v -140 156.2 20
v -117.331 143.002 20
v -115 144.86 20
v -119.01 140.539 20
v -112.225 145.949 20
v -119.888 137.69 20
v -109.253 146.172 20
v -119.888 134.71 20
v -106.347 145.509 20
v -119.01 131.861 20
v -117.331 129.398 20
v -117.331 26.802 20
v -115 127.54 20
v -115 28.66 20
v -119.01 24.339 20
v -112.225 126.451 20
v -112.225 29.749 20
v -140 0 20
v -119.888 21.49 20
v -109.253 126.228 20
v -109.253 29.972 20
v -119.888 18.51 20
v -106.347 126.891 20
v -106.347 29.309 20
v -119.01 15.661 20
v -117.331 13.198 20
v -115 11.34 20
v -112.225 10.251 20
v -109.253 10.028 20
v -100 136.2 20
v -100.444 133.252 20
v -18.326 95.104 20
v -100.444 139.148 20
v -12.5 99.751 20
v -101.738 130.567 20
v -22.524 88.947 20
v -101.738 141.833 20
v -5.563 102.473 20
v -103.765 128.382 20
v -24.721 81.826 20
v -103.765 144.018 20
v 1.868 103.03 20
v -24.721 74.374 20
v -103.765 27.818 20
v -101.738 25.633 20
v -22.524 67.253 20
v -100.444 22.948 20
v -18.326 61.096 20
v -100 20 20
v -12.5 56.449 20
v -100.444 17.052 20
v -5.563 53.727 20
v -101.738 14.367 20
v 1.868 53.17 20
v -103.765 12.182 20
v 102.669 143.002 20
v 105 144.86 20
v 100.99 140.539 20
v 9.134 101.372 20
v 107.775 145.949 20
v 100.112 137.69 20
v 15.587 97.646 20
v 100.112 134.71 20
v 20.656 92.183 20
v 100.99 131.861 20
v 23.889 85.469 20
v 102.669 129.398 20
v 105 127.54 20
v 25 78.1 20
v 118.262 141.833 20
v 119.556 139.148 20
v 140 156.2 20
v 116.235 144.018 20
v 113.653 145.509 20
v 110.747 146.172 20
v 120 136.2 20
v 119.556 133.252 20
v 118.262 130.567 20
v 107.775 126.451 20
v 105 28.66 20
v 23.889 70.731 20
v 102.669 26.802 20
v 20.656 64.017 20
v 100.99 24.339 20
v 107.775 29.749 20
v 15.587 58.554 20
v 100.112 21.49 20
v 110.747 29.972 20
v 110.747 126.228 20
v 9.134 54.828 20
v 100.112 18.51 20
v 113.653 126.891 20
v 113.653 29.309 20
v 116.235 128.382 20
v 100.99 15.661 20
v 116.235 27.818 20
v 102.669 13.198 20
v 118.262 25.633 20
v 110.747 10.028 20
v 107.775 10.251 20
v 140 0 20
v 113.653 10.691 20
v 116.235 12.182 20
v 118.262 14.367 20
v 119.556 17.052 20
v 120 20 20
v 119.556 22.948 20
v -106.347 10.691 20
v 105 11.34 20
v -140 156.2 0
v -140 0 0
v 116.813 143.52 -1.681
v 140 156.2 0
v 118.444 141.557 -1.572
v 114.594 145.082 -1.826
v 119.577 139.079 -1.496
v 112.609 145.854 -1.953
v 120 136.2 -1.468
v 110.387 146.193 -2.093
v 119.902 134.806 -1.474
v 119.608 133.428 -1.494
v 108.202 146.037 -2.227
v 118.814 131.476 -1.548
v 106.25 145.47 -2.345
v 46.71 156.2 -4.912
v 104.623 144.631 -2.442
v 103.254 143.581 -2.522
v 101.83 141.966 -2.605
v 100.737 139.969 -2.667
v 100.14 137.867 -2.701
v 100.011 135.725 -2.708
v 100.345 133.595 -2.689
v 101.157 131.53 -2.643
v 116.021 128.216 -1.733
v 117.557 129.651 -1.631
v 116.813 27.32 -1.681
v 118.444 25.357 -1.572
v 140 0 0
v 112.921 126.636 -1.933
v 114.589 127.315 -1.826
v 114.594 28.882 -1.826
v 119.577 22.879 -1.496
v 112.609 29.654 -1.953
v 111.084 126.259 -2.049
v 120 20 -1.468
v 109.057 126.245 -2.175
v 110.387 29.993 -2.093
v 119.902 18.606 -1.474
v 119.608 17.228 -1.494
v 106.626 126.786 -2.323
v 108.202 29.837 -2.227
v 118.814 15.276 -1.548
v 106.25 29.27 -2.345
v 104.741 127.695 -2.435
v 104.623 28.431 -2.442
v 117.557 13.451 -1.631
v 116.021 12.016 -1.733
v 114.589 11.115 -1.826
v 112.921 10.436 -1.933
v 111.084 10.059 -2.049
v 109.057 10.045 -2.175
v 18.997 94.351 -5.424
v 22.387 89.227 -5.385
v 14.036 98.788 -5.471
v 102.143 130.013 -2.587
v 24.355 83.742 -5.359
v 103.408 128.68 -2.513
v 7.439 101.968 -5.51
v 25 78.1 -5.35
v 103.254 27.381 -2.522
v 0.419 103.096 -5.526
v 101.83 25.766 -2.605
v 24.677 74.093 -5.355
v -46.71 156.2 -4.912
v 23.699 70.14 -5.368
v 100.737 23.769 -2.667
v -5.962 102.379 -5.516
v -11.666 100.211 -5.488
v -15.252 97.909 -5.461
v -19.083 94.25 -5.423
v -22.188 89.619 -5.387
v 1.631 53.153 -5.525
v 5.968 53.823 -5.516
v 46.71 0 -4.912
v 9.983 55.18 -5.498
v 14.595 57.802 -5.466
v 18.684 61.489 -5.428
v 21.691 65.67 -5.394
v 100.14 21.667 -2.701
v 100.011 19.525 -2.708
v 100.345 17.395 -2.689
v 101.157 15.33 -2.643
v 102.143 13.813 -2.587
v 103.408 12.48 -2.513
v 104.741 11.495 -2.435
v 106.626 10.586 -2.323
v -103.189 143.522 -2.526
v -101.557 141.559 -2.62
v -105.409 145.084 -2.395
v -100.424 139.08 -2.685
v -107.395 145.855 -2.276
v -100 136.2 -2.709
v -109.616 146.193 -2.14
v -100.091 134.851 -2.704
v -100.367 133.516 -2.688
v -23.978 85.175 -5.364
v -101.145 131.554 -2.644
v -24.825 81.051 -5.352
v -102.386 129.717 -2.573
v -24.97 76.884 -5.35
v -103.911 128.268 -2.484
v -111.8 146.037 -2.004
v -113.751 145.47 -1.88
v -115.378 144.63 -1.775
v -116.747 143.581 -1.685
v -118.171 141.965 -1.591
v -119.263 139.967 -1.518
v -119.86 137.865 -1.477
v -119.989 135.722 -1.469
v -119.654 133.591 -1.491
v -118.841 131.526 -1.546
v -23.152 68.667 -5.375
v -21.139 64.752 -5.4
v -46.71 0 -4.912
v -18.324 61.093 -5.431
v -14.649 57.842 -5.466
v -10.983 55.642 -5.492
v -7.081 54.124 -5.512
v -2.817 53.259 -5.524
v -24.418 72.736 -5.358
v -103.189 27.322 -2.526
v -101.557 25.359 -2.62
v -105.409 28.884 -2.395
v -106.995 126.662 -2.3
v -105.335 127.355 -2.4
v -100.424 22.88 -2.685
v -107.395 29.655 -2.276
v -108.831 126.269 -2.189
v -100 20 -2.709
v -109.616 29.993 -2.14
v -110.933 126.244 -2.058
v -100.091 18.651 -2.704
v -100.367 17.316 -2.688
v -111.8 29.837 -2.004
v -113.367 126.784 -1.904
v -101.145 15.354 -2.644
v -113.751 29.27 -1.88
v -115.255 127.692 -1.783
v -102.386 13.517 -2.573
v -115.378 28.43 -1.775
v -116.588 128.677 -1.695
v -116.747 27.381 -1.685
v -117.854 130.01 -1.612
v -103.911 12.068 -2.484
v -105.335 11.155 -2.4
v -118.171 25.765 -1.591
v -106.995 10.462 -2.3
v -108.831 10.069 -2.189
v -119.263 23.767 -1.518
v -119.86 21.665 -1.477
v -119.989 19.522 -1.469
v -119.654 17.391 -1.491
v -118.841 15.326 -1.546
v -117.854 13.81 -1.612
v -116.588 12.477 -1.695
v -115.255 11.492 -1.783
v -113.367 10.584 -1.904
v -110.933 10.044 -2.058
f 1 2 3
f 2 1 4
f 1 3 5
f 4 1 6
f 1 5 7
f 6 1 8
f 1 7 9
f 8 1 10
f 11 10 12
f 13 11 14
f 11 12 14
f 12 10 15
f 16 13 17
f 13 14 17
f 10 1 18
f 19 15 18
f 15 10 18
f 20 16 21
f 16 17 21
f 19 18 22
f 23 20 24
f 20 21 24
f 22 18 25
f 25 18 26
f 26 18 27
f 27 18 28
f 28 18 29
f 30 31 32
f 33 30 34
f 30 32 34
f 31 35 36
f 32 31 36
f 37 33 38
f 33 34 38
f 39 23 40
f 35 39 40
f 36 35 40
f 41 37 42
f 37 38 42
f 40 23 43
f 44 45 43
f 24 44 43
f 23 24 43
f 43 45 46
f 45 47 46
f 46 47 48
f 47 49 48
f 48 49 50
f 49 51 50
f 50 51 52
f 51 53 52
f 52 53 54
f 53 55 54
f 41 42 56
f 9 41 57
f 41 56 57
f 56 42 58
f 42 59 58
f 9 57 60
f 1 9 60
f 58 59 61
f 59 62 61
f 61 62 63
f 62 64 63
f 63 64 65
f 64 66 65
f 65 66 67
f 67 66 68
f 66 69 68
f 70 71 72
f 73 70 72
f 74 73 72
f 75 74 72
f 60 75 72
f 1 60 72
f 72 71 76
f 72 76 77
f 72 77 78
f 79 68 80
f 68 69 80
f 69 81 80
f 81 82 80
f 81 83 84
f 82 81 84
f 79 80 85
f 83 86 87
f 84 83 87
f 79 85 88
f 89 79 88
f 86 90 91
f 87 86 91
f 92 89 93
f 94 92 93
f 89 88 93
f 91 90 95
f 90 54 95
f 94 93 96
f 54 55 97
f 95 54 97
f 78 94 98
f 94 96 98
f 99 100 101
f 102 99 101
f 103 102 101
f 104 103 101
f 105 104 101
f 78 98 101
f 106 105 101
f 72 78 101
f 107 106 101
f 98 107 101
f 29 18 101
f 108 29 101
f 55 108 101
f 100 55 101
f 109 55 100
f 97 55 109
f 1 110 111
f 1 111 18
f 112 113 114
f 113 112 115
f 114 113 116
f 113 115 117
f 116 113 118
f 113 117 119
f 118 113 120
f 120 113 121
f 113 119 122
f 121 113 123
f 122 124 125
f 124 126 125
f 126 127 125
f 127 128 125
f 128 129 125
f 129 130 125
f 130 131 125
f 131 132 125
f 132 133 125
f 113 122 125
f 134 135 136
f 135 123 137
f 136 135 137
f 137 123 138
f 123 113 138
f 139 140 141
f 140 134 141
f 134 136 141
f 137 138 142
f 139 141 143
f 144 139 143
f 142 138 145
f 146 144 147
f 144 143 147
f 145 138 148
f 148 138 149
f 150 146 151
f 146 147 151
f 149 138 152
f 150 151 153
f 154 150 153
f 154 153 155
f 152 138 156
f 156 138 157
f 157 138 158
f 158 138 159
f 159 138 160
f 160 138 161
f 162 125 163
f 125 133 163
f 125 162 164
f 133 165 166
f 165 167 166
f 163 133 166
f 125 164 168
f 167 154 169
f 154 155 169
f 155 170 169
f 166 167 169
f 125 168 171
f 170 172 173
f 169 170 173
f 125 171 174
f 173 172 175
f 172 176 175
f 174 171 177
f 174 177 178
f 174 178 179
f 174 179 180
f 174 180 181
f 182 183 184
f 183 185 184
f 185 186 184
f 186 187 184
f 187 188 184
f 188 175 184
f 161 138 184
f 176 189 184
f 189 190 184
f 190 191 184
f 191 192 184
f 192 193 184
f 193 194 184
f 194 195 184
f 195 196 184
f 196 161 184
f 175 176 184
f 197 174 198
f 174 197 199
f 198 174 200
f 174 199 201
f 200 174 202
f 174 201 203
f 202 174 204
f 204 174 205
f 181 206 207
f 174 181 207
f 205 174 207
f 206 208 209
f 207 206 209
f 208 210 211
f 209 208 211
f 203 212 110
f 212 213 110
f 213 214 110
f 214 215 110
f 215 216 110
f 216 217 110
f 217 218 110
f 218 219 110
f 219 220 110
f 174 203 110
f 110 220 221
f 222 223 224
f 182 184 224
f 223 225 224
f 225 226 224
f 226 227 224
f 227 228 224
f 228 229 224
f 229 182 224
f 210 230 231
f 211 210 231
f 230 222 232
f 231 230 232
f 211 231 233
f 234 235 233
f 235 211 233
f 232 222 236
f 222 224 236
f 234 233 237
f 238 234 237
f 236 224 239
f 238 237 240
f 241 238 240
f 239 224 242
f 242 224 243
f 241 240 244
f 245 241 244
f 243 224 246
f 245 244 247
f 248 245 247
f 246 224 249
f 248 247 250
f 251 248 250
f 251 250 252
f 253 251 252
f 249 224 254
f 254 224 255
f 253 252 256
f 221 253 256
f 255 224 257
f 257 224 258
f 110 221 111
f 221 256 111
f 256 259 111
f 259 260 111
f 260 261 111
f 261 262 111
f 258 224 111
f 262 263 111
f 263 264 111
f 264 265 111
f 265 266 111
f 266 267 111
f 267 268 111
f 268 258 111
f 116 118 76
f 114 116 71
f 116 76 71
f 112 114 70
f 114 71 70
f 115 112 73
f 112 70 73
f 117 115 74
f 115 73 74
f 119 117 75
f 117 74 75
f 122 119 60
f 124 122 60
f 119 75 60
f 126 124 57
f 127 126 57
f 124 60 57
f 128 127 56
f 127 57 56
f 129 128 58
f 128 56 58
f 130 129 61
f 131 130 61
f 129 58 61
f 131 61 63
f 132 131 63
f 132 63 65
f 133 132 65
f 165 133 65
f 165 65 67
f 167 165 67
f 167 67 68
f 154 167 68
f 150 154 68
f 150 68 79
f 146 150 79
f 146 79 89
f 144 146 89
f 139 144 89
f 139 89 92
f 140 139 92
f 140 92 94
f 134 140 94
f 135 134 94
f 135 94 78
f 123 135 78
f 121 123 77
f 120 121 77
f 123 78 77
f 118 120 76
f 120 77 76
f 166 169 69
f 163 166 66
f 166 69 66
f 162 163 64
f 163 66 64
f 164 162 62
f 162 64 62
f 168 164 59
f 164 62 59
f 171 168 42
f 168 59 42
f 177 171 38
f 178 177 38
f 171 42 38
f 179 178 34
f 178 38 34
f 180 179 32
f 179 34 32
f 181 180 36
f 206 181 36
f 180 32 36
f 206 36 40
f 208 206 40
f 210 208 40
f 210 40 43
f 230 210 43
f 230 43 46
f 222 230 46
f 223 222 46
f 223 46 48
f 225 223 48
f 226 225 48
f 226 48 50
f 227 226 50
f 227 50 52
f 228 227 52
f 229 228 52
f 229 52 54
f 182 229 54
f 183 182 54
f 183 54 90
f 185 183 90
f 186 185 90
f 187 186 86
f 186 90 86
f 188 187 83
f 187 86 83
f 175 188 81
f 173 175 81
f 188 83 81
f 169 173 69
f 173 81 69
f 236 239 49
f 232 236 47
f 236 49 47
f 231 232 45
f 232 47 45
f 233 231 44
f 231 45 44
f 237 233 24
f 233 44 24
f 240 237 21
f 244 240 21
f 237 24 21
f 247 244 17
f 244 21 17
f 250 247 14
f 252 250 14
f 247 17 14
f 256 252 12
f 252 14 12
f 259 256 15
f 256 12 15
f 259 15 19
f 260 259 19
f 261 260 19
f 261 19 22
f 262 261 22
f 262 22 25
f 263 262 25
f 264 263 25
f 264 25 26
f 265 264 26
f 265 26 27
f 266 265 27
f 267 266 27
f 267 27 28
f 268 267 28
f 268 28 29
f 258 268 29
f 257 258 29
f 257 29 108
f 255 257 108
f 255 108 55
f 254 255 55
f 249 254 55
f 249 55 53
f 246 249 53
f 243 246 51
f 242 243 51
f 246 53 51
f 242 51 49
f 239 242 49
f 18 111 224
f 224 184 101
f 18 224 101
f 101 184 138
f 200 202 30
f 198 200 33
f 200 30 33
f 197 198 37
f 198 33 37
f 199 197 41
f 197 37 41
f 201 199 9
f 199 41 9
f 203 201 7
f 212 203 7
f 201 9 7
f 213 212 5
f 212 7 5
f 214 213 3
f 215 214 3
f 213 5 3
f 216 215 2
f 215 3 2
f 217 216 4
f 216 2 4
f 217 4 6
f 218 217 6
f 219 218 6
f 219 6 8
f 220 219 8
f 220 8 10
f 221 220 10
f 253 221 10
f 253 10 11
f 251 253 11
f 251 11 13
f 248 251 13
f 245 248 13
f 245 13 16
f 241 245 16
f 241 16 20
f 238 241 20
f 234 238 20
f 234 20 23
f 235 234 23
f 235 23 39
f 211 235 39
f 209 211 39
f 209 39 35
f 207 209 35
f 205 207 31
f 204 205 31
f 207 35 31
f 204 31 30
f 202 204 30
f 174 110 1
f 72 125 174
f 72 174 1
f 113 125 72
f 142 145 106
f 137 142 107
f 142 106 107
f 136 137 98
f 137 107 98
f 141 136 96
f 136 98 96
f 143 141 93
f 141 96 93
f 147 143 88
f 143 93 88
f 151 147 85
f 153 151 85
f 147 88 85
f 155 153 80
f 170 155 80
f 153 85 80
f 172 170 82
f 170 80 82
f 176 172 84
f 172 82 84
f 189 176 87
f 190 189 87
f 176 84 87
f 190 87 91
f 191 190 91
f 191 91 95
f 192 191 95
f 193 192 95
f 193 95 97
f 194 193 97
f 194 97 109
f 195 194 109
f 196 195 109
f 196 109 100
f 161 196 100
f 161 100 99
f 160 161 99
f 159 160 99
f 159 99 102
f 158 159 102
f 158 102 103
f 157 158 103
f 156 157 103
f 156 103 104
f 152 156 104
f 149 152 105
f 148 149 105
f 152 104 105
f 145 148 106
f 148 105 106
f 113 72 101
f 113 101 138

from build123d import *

# Parameters (mm, degrees)
BOSS_EXTRUDE1_DEPTH = 156.2
SKETCH2_R           = 10
SKETCH2_R_2         = 25
CUT_EXTRUDE1_DEPTH  = 26.525992736


with BuildPart() as part:
    # Sketch1 → Boss-Extrude1 (new body)
    with BuildSketch(Plane(origin=(0, 0, 0), x_dir=(1, 0, 0), z_dir=(0, 1, 0))):
        with BuildLine():
            Line((-140, 0), (-140, -20))
            Line((-140, -20), (140, -20))
            Line((140, -20), (140, 0))
            ThreePointArc((140, 0), (0, 5.525992736), (-140, 0))
        make_face()
    extrude(amount=BOSS_EXTRUDE1_DEPTH)

    # Sketch2 → Cut-Extrude1 (cut, through all)
    with BuildSketch(Plane.XY.offset(20)):
        with Locations((-110, 136.2)):
            Circle(SKETCH2_R)
        with Locations((-110, 20)):
            Circle(SKETCH2_R)
        with Locations((110, 20)):
            Circle(SKETCH2_R)
        with Locations((110, 136.2)):
            Circle(SKETCH2_R)
        with Locations((0, 78.1)):
            Circle(SKETCH2_R_2)
    extrude(amount=-CUT_EXTRUDE1_DEPTH, mode=Mode.SUBTRACT)


solid = part.part
